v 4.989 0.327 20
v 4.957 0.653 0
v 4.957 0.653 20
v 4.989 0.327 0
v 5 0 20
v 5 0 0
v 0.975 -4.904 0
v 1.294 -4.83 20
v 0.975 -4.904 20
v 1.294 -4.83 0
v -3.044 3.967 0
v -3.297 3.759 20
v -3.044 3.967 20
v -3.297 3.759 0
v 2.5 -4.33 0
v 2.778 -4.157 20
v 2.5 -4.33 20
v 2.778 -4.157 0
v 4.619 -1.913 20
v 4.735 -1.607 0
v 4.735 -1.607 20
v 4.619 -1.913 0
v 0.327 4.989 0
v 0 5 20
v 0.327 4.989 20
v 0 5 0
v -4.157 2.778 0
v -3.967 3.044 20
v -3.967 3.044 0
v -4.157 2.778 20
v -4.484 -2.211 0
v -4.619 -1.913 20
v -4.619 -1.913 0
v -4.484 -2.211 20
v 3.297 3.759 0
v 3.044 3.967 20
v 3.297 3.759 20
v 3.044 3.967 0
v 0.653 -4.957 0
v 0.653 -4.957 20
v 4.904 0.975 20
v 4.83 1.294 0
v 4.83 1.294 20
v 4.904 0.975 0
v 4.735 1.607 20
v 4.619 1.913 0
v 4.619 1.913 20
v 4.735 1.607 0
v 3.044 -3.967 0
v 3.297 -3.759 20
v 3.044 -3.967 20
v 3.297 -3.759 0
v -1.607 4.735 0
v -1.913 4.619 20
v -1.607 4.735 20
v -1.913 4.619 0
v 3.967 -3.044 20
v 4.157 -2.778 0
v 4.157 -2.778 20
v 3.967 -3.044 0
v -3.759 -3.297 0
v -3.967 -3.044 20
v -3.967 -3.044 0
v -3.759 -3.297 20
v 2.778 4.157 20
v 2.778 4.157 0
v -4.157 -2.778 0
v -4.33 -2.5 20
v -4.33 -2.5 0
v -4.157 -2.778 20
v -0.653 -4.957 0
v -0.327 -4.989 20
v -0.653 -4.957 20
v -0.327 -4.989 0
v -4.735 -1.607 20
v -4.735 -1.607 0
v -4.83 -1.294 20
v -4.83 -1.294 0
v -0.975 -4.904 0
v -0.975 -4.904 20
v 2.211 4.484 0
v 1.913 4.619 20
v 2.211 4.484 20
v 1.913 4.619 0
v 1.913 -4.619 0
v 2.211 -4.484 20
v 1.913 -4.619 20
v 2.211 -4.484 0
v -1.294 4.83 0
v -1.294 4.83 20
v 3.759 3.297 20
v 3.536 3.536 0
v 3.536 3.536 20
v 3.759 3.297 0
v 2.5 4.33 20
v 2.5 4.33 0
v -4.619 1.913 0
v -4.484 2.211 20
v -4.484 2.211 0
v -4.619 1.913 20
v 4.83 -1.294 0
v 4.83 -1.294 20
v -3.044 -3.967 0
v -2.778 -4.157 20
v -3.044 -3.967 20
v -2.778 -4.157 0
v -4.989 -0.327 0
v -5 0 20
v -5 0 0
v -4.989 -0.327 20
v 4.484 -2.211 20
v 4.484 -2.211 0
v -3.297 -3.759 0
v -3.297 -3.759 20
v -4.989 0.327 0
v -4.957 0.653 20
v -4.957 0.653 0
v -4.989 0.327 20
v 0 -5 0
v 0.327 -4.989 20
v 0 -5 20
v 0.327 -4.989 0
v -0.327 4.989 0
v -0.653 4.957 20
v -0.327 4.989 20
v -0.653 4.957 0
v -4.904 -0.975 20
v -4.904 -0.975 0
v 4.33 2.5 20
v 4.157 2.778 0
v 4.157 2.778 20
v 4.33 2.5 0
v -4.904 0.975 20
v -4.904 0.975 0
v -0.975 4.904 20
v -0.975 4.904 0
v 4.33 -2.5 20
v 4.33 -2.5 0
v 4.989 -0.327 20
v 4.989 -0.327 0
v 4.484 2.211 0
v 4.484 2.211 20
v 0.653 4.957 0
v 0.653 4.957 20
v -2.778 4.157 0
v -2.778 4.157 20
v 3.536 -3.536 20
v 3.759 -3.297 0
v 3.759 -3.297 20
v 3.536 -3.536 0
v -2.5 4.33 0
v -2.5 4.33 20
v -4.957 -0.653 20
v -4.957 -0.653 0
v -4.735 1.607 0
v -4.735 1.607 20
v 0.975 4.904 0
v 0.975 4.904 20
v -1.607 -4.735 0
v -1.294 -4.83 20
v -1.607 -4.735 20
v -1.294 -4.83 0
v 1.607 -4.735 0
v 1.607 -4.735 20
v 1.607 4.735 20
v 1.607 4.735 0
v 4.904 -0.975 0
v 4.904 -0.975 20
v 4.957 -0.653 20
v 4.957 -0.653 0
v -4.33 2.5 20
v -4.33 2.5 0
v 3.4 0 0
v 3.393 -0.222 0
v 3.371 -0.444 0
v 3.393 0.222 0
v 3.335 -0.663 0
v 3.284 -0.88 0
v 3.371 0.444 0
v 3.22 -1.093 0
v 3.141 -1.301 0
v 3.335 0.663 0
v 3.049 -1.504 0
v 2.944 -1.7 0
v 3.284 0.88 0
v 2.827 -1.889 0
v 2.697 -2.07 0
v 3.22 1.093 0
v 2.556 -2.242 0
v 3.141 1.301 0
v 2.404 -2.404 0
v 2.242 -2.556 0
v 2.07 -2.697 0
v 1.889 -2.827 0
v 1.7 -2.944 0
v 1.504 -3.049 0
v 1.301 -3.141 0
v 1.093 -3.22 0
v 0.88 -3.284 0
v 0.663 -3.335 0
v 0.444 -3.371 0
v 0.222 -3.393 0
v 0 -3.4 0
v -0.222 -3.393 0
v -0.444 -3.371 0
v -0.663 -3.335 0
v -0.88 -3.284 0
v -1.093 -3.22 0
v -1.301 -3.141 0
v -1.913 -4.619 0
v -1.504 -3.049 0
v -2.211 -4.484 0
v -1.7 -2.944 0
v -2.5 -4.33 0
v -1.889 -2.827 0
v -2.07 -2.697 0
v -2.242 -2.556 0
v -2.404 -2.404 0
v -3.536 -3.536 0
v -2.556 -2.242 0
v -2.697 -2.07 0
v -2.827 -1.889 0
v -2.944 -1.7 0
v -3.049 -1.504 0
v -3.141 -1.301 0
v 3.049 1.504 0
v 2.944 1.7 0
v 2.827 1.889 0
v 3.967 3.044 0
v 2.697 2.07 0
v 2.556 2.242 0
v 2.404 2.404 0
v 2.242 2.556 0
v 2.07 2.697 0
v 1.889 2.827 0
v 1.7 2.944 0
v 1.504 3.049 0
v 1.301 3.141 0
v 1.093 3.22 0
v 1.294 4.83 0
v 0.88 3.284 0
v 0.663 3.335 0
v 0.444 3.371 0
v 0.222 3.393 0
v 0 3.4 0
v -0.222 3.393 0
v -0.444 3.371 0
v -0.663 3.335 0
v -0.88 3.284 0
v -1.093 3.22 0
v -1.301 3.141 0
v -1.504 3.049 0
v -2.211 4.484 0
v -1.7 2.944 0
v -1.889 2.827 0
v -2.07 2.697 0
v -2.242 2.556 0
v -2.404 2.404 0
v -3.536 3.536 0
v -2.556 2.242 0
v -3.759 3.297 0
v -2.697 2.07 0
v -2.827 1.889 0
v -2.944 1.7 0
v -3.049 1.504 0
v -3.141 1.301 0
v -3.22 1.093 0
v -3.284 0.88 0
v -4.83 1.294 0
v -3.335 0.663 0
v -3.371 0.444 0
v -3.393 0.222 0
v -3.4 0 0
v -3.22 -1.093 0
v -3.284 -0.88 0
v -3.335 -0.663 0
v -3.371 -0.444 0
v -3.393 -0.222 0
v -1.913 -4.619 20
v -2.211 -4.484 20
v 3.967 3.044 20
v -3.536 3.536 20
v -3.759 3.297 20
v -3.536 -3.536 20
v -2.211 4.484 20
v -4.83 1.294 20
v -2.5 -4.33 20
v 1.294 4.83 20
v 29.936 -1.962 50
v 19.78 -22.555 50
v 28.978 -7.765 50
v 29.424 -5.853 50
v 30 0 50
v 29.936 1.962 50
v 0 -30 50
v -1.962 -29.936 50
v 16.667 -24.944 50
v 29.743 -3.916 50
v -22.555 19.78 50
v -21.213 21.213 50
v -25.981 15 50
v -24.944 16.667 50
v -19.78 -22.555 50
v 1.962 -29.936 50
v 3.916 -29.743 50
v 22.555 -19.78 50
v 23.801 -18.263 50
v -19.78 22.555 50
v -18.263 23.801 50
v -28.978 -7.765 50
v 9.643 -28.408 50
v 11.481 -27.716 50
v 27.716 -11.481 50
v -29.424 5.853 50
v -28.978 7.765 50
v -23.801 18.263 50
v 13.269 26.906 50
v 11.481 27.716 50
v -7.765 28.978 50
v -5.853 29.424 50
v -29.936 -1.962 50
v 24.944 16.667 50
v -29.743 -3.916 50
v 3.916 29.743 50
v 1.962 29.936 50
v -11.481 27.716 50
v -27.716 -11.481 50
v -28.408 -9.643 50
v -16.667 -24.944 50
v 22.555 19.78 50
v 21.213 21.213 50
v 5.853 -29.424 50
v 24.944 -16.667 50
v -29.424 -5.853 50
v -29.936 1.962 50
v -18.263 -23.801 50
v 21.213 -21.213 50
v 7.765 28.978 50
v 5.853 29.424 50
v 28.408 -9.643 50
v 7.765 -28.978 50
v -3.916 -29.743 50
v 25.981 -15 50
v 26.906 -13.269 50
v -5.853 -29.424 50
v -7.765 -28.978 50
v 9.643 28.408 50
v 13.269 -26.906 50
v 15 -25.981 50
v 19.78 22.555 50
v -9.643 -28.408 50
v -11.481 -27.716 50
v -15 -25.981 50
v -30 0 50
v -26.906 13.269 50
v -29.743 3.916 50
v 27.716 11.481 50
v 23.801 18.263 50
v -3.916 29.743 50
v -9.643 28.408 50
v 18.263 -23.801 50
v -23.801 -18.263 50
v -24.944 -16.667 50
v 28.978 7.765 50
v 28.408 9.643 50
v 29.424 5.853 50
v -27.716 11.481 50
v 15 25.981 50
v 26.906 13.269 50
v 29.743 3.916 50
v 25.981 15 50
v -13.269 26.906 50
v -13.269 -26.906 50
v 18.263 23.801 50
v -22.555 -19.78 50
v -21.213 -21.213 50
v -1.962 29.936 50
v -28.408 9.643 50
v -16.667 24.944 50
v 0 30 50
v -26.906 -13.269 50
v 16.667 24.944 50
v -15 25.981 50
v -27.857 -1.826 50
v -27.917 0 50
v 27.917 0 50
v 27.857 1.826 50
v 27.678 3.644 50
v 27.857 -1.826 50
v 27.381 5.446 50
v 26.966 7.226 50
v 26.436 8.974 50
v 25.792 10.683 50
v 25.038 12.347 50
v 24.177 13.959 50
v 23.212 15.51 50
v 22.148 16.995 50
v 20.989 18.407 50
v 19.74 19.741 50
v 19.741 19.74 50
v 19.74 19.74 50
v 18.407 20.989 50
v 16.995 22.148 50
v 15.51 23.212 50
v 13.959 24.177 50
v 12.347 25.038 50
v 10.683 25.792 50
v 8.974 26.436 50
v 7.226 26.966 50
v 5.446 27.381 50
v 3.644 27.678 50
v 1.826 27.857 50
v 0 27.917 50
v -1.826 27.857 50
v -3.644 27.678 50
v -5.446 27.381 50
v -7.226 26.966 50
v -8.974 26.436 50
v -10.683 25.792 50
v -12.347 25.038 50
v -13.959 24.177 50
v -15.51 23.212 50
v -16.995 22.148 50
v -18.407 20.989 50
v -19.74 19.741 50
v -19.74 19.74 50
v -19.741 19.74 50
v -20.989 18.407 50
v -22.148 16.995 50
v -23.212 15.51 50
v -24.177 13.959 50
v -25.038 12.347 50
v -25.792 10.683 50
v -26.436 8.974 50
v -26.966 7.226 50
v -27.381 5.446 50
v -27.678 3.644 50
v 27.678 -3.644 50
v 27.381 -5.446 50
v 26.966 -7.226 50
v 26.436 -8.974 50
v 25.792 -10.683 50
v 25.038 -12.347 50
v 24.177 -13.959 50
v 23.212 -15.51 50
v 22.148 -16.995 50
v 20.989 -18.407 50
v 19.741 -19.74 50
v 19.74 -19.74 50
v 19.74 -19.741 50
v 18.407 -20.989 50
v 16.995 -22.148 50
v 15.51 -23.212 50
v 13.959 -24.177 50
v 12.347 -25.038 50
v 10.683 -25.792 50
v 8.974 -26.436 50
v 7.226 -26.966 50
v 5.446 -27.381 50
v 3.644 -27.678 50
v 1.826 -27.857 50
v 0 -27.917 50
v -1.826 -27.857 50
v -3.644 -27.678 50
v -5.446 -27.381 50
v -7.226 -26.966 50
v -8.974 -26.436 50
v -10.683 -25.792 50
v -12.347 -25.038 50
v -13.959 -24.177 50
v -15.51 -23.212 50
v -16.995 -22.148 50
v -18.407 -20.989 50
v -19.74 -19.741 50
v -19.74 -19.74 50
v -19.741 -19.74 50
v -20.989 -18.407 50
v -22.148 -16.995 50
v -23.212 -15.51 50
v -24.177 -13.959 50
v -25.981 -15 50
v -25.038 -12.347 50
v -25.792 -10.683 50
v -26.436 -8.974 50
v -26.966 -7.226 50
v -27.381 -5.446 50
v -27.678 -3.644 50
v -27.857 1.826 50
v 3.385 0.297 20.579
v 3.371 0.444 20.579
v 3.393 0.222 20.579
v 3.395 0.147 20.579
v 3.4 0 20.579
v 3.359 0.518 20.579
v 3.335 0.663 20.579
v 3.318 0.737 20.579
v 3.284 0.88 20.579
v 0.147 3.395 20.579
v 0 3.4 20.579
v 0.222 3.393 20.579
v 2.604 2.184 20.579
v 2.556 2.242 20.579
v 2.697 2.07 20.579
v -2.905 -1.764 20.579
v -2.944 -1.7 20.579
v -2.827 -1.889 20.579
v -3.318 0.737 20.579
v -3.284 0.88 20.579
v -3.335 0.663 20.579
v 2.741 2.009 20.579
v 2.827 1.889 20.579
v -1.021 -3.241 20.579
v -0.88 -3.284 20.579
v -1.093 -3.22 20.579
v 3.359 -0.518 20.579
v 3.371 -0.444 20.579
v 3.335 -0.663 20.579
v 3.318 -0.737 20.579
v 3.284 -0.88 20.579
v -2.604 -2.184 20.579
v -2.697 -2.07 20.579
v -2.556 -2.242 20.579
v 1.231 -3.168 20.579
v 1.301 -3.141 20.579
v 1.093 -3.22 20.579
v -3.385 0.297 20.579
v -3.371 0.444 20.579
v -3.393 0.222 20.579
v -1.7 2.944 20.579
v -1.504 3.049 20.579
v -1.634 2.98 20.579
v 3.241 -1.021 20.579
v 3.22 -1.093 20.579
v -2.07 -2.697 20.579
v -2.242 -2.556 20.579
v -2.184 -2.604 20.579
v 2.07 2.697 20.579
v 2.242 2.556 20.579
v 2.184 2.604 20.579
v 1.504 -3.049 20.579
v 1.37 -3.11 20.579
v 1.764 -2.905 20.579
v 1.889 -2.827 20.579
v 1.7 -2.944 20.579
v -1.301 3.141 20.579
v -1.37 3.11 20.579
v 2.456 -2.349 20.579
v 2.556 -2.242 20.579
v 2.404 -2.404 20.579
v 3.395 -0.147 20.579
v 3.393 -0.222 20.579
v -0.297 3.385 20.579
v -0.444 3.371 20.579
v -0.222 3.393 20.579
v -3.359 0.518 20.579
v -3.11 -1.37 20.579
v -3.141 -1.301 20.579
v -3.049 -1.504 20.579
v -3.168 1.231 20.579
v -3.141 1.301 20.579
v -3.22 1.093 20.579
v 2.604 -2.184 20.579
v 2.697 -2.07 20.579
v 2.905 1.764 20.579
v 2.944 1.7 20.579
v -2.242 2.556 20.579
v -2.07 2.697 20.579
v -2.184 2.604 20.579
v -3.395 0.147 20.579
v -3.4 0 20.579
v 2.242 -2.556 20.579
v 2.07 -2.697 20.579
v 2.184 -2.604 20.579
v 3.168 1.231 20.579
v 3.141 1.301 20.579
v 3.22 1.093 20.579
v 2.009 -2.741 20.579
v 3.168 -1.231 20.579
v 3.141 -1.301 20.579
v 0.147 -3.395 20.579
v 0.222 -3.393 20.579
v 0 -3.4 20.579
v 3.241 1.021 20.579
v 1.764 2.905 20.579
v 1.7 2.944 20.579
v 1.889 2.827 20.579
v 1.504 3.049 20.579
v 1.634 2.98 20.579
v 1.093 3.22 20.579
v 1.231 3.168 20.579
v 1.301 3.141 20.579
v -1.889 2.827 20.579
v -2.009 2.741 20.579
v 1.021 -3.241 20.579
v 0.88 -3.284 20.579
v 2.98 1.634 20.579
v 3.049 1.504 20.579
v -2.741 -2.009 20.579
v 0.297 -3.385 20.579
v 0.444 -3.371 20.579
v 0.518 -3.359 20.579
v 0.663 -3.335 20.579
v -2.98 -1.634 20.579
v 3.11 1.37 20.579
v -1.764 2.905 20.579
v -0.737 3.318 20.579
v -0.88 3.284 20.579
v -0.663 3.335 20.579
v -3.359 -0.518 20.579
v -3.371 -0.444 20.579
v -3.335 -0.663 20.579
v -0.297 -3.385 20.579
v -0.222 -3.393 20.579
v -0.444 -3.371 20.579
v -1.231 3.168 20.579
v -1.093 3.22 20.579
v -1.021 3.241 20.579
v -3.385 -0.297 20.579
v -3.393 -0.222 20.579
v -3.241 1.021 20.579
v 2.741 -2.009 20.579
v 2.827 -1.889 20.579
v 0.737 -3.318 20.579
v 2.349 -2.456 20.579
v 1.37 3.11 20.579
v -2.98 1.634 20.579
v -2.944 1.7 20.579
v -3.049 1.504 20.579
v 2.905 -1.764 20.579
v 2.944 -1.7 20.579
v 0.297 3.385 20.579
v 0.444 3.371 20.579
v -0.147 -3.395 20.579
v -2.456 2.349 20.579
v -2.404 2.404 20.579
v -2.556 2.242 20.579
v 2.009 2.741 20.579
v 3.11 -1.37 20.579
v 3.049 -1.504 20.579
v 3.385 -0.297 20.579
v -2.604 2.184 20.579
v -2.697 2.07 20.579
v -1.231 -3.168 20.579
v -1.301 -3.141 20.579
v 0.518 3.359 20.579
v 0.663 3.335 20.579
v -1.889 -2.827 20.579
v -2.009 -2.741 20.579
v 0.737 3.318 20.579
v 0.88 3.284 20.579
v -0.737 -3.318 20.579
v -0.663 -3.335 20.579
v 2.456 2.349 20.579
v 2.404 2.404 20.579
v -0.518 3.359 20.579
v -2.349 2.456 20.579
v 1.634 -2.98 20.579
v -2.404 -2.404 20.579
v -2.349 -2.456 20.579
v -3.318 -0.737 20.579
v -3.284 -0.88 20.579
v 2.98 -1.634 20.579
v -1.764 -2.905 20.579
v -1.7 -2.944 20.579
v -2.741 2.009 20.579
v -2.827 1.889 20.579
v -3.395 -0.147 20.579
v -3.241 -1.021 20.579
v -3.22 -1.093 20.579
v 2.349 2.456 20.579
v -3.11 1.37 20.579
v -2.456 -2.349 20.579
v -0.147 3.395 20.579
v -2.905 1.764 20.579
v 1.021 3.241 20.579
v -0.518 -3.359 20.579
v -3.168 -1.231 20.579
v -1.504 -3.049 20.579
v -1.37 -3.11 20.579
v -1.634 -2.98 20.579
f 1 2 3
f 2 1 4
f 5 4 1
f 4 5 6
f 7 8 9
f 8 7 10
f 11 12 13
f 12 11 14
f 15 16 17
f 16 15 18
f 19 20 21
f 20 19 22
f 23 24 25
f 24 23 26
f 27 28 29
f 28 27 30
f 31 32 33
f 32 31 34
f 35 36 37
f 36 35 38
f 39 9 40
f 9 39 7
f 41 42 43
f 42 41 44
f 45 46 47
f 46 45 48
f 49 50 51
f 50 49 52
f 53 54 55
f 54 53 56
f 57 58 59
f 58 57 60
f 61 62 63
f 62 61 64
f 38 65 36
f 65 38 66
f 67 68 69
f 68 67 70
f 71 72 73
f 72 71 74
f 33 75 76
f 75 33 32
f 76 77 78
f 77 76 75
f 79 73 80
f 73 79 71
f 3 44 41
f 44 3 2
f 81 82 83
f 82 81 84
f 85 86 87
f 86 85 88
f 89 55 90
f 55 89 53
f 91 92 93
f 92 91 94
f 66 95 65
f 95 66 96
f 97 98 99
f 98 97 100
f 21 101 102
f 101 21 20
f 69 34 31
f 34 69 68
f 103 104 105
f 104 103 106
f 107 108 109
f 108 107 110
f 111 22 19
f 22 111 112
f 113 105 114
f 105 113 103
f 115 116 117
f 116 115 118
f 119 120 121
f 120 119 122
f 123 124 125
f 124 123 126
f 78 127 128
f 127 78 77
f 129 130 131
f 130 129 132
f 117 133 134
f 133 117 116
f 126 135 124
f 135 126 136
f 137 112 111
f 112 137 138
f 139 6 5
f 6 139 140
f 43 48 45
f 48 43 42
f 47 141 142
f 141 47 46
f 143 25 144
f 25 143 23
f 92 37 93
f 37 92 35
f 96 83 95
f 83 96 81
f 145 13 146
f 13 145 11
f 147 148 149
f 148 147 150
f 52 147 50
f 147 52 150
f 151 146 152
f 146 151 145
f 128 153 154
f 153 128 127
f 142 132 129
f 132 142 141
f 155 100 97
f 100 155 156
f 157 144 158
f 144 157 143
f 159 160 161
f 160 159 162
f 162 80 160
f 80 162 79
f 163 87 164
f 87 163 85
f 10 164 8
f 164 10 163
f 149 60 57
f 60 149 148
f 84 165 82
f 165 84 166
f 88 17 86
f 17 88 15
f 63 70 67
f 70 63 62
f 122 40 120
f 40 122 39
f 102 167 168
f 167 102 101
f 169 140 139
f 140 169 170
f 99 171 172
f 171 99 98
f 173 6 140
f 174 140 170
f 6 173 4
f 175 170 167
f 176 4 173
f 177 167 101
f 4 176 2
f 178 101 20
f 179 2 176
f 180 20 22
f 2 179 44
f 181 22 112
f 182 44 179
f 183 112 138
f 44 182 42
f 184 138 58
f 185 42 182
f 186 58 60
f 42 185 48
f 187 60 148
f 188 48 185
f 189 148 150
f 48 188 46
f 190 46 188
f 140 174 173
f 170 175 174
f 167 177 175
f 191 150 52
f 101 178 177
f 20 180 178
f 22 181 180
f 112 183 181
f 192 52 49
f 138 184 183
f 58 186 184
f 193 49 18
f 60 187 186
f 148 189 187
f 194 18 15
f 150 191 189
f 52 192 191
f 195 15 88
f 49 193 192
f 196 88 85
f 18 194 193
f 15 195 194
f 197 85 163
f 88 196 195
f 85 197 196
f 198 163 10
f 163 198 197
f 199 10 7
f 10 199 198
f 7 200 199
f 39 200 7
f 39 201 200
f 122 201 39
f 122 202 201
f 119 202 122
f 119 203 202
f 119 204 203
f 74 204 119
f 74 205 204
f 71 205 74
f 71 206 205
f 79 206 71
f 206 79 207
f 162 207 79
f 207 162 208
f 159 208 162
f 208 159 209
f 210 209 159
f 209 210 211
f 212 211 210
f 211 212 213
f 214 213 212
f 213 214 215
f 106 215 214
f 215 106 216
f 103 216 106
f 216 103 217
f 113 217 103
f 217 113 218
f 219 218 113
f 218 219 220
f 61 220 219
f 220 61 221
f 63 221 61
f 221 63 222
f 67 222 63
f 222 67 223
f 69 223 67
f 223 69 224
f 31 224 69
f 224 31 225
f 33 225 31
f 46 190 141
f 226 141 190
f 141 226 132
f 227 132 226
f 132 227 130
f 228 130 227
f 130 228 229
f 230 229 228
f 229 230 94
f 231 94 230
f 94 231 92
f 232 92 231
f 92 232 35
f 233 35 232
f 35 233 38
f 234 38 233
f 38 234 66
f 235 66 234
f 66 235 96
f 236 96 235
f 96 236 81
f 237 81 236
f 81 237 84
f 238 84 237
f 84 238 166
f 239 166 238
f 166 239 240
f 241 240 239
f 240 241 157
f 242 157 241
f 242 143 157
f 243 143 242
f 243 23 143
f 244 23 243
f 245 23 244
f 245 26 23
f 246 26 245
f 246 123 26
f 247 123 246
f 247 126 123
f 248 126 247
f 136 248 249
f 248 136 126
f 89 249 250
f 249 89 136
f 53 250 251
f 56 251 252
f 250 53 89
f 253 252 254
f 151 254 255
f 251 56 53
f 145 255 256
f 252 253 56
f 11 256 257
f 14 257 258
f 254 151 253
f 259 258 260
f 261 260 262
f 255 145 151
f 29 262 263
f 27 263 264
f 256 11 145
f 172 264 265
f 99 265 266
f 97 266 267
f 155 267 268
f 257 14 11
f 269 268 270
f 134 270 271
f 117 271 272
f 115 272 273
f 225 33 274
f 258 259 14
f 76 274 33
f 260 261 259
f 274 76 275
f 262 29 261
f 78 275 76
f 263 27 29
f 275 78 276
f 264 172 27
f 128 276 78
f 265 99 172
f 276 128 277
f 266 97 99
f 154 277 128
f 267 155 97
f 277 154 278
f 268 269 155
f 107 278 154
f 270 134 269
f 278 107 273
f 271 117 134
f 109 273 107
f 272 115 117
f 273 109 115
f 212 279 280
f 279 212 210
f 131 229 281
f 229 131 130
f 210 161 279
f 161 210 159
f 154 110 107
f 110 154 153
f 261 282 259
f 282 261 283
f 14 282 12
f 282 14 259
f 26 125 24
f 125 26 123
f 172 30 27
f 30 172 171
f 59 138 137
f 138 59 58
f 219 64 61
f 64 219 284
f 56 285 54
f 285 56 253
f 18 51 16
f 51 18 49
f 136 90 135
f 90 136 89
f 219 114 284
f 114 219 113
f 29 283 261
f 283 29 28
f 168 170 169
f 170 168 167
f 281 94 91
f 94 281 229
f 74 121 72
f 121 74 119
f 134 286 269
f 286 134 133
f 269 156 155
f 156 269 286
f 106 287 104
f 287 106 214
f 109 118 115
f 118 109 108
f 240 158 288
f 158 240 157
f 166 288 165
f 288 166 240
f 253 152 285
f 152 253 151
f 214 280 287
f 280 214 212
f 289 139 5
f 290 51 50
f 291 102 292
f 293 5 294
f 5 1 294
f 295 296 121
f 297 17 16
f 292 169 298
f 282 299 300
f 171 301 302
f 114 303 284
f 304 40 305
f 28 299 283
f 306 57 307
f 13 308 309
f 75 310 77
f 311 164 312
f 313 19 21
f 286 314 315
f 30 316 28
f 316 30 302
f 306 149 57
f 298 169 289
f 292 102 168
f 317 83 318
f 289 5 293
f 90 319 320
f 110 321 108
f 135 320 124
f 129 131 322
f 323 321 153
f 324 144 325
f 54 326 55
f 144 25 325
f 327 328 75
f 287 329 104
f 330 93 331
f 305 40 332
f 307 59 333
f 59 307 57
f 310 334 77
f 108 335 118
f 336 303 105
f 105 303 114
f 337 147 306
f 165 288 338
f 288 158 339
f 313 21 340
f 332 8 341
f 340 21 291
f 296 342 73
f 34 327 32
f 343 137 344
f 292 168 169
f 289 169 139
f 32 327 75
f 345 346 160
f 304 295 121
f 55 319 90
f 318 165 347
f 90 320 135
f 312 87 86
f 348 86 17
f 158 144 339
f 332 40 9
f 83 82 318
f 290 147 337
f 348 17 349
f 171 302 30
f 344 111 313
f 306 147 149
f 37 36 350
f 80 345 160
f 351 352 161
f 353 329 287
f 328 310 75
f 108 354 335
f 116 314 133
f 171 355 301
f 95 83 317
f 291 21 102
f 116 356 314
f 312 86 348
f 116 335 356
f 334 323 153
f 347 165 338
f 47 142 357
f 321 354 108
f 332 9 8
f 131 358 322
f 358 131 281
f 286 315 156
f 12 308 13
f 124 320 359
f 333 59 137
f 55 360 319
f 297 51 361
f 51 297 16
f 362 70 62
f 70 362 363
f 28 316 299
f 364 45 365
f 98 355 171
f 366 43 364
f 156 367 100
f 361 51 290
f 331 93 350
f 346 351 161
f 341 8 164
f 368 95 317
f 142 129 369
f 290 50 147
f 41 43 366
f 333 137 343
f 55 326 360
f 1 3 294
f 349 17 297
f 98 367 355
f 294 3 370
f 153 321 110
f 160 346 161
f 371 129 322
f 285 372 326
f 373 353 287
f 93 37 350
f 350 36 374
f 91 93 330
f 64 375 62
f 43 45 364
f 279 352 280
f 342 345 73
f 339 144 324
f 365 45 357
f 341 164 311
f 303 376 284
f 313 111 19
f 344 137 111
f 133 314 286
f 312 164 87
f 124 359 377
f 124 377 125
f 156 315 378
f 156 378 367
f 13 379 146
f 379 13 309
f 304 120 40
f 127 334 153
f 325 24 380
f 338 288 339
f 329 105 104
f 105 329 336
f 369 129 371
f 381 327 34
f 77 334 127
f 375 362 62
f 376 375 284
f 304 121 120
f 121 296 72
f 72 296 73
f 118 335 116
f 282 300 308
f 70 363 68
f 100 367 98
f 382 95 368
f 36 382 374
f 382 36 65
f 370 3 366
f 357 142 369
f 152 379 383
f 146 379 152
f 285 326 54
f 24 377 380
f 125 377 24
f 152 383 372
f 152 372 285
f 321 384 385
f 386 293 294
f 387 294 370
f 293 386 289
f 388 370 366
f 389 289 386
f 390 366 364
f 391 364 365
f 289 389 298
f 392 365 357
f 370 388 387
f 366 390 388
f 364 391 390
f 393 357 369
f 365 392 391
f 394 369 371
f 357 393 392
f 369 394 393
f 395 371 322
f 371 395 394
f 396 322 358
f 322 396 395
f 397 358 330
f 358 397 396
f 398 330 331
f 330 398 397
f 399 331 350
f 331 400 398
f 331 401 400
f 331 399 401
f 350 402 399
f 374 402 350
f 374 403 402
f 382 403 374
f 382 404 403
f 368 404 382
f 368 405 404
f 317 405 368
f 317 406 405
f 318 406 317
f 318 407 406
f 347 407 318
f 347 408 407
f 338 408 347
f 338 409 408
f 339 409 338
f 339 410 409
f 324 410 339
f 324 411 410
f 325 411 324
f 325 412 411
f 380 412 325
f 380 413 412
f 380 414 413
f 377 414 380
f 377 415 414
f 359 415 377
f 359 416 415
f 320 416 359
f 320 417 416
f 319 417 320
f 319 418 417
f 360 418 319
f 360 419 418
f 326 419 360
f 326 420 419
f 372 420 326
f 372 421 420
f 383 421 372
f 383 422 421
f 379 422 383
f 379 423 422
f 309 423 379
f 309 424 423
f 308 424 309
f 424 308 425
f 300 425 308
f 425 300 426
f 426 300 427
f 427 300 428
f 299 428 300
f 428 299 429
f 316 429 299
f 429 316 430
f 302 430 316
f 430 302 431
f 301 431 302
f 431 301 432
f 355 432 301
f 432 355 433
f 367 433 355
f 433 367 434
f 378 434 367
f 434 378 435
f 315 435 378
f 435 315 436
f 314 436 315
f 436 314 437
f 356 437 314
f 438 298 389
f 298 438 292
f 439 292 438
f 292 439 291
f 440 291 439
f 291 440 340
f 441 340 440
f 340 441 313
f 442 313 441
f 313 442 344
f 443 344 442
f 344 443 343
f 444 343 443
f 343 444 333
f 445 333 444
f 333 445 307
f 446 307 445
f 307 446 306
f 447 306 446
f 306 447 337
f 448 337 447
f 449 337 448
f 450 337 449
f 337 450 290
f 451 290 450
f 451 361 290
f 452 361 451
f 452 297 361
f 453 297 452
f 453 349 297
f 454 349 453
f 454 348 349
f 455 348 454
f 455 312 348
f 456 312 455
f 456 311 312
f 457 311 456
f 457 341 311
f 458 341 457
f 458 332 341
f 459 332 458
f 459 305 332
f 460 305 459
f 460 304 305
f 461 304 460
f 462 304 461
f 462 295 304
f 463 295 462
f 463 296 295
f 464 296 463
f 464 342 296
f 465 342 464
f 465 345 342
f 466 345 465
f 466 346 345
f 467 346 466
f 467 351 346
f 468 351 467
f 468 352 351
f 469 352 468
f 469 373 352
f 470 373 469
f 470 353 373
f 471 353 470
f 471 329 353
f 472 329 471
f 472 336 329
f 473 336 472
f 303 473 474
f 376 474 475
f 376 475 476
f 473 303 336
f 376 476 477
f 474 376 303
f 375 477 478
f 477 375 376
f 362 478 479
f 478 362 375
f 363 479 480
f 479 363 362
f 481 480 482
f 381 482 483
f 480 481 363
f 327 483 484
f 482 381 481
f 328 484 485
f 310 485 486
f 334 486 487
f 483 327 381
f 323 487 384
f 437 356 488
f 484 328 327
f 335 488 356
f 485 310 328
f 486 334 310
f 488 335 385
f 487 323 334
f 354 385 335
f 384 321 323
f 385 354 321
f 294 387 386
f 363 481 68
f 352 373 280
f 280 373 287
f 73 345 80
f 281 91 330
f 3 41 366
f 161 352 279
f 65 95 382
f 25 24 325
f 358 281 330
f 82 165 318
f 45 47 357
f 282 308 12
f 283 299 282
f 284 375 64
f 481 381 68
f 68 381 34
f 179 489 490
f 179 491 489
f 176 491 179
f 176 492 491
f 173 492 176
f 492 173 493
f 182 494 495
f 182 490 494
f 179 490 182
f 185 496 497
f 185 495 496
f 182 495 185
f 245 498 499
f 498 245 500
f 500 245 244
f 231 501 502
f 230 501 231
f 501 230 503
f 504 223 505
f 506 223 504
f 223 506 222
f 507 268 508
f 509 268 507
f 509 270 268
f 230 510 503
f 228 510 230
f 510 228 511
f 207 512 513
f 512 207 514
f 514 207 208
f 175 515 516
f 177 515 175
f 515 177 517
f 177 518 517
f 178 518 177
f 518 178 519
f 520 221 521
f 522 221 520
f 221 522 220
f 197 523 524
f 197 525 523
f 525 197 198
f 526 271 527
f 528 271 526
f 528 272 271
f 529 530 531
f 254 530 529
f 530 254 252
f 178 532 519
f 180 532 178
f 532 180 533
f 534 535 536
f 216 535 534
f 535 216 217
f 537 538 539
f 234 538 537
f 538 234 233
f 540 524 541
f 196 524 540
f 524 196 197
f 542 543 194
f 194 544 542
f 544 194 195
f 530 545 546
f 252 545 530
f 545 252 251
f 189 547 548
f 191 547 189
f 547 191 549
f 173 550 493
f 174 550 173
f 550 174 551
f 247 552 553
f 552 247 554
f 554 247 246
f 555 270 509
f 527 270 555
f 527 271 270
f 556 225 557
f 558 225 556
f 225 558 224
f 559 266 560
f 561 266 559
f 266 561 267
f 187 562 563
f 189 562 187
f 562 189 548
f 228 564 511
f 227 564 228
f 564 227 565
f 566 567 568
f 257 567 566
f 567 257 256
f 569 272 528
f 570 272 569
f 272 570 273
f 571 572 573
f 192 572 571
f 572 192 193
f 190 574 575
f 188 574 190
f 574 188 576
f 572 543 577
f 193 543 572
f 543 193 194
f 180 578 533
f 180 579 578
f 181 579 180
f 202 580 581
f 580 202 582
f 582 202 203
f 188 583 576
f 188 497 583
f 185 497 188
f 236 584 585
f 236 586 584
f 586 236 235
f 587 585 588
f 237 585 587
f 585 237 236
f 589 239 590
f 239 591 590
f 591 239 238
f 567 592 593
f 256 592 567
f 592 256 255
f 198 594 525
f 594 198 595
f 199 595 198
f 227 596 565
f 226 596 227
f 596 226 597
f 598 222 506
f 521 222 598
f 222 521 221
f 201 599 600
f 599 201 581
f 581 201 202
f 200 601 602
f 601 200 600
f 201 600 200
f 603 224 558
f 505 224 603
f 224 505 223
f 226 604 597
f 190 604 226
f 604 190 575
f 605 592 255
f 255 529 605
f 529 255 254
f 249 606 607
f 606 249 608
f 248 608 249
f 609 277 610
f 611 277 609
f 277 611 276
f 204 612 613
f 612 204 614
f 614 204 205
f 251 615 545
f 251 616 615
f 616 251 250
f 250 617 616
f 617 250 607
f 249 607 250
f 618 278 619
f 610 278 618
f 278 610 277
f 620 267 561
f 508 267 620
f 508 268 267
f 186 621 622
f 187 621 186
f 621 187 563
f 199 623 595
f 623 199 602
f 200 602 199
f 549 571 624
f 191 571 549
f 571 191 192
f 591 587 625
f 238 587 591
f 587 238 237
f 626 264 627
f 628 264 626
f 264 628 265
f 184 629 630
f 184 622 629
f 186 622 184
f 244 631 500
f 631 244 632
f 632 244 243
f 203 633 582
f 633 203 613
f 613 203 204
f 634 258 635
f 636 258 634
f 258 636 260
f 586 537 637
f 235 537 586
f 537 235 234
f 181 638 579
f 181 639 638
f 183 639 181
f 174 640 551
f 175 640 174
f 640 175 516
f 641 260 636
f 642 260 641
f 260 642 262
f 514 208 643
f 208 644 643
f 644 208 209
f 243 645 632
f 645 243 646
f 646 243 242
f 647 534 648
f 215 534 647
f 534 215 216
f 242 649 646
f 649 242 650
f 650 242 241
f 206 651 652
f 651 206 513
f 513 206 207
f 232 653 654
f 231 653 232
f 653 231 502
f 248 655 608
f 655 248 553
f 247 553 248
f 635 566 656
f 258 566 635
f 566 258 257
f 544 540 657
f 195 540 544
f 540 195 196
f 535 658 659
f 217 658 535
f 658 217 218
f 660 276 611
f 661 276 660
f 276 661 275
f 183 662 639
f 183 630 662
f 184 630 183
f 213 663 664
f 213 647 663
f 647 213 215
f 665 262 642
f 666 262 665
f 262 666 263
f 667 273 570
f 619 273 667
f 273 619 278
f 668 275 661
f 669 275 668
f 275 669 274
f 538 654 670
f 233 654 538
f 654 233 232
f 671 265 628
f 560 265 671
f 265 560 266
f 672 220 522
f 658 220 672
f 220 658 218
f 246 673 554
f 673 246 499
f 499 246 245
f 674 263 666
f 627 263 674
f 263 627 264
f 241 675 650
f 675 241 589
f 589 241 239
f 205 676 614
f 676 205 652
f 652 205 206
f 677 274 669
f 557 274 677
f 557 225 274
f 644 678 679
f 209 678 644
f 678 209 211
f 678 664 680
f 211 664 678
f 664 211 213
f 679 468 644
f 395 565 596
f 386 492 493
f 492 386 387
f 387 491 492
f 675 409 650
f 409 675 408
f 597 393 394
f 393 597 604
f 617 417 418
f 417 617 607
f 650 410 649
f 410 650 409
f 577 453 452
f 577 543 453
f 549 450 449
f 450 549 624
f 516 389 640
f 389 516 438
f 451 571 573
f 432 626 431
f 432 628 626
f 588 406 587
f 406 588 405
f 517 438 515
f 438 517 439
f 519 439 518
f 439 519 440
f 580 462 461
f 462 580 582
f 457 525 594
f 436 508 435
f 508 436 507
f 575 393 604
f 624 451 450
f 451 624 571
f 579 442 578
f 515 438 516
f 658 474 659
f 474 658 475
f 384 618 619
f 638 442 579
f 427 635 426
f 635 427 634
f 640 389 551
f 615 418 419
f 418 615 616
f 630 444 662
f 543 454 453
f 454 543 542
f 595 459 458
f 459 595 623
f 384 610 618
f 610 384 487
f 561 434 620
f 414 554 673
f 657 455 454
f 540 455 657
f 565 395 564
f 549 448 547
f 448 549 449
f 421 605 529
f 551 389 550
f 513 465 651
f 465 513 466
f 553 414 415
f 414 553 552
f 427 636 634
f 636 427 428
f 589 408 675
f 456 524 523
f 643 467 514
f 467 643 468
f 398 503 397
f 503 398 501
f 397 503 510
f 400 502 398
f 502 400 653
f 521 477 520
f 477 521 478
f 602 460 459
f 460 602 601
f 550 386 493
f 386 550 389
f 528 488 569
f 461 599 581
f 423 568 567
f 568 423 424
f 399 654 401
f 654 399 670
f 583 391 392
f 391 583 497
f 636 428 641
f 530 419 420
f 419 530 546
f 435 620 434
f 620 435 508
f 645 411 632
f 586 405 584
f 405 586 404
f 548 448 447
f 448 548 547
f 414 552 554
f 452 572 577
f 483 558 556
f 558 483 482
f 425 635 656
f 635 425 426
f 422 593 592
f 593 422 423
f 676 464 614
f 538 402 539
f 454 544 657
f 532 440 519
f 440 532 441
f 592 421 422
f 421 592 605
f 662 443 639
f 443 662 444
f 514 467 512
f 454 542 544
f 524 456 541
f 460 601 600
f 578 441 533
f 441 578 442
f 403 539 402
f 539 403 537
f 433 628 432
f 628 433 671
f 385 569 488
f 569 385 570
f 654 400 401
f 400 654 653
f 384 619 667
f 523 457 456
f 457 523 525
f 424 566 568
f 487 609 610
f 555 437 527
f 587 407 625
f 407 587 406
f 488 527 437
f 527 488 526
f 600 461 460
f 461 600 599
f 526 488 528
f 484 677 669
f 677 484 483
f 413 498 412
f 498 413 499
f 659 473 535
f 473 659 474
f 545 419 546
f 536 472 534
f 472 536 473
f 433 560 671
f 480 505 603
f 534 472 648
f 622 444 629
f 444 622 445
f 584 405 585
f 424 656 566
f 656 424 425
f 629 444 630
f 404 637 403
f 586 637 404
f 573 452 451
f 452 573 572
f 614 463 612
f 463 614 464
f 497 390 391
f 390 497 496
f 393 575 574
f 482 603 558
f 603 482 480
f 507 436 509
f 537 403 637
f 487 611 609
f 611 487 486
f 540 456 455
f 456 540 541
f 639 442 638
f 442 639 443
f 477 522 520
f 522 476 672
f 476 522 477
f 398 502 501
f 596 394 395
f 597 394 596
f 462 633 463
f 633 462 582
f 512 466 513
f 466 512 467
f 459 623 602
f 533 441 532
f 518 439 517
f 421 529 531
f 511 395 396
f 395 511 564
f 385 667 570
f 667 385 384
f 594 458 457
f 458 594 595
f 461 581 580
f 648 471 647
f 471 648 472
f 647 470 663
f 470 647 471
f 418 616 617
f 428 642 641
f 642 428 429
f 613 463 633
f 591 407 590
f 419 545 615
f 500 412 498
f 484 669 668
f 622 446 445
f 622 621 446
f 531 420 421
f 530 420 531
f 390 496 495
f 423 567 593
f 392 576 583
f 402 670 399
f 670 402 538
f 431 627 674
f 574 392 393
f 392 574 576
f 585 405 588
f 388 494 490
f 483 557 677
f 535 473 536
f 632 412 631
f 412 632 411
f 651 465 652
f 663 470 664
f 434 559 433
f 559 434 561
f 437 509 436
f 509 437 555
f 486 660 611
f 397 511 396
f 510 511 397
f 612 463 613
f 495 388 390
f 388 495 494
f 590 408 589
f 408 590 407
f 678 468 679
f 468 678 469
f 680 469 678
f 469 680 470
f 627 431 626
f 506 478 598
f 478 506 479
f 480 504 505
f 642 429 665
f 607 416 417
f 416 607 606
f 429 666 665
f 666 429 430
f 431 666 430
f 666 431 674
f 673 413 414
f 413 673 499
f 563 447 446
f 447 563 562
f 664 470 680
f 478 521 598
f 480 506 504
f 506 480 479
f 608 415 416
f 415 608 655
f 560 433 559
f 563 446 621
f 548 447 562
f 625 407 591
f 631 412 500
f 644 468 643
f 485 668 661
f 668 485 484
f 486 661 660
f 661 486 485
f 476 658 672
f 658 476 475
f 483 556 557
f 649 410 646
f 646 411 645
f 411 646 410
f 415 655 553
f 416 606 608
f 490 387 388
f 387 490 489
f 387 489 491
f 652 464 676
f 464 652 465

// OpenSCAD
// Small lab funnel, 60 mm, with straight spout
// Category: tools. The wall is `wall` thick measured perpendicular to the cone (the
// cone is offset by wall / cos(cone angle)). With the default sizes the cone wall is 40 deg
// from vertical, so it prints upright without supports; use a brim (it stands on the
// 10 mm spout), or print it rim-down for a much larger bed contact. Upright printing needs
// top_od - spout_od <= 2 * cone_h (at most 45 deg); wider cones should be printed rim-down.
// Spout: 10 mm OD x 20 mm; fits 15 and 50 mL conical tubes and necks of 11 mm ID or more.
// In a tight neck, hold it off-centre so air can escape.
// Print: PETG, 0.2 mm layers, 3+ perimeters.
// Chemicals: PETG is fine with water, buffers and ethanol; NOT acetone, phenol or
// chloroform. Polypropylene resists more solvents but needs a PP-tape bed to print.
// SPDX-License-Identifier: CERN-OHL-P-2.0

/* [Funnel] */
// outer diameter at the rim
top_od = 60;
// outer diameter of the spout
spout_od = 10;
// true wall thickness
wall = 1.6; // 0.1
// spout from z = 0 to z = spout_h
spout_h = 20;
// cone from z = spout_h to the rim
cone_h = 30;

/* [Hidden] */
$fn = 96;
eps = 0.01;
half_angle = atan((top_od - spout_od) / 2 / cone_h);
wall_h = wall / cos(half_angle);   // horizontal wall that gives `wall` normal to the cone

// parameter checks: stop with a message instead of building a broken part
assert(spout_od - 2 * wall >= 1, "the spout bore is closed: reduce wall or widen spout_od");
assert(top_od > spout_od, "top_od must be larger than spout_od");
assert(spout_od / 2 - wall_h >= 0.5, "the cone wall closes the spout: reduce wall or widen spout_od");
ext = min(2, (spout_od / 2 - wall_h) / tan(half_angle));  // inner cone below the junction, never past its tip

difference() {
    union() {
        cylinder(d = spout_od, h = spout_h + eps);
        translate([0, 0, spout_h]) cylinder(d1 = spout_od, d2 = top_od, h = cone_h);
    }
    // spout bore, continued up into the cone until the inner cone is as wide, so there is no throat
    translate([0, 0, -eps]) cylinder(d = spout_od - 2 * wall, h = spout_h + (wall_h - wall) / tan(half_angle) + 2 * eps);
    // inner cone, extended below the junction (by up to 2 mm; less where a narrow spout would put its tip lower)
    translate([0, 0, spout_h - ext]) cylinder(d1 = spout_od - 2 * wall_h - 2 * ext * tan(half_angle),
                                              d2 = top_od - 2 * wall_h + 2 * eps * tan(half_angle), h = cone_h + ext + eps);
}
